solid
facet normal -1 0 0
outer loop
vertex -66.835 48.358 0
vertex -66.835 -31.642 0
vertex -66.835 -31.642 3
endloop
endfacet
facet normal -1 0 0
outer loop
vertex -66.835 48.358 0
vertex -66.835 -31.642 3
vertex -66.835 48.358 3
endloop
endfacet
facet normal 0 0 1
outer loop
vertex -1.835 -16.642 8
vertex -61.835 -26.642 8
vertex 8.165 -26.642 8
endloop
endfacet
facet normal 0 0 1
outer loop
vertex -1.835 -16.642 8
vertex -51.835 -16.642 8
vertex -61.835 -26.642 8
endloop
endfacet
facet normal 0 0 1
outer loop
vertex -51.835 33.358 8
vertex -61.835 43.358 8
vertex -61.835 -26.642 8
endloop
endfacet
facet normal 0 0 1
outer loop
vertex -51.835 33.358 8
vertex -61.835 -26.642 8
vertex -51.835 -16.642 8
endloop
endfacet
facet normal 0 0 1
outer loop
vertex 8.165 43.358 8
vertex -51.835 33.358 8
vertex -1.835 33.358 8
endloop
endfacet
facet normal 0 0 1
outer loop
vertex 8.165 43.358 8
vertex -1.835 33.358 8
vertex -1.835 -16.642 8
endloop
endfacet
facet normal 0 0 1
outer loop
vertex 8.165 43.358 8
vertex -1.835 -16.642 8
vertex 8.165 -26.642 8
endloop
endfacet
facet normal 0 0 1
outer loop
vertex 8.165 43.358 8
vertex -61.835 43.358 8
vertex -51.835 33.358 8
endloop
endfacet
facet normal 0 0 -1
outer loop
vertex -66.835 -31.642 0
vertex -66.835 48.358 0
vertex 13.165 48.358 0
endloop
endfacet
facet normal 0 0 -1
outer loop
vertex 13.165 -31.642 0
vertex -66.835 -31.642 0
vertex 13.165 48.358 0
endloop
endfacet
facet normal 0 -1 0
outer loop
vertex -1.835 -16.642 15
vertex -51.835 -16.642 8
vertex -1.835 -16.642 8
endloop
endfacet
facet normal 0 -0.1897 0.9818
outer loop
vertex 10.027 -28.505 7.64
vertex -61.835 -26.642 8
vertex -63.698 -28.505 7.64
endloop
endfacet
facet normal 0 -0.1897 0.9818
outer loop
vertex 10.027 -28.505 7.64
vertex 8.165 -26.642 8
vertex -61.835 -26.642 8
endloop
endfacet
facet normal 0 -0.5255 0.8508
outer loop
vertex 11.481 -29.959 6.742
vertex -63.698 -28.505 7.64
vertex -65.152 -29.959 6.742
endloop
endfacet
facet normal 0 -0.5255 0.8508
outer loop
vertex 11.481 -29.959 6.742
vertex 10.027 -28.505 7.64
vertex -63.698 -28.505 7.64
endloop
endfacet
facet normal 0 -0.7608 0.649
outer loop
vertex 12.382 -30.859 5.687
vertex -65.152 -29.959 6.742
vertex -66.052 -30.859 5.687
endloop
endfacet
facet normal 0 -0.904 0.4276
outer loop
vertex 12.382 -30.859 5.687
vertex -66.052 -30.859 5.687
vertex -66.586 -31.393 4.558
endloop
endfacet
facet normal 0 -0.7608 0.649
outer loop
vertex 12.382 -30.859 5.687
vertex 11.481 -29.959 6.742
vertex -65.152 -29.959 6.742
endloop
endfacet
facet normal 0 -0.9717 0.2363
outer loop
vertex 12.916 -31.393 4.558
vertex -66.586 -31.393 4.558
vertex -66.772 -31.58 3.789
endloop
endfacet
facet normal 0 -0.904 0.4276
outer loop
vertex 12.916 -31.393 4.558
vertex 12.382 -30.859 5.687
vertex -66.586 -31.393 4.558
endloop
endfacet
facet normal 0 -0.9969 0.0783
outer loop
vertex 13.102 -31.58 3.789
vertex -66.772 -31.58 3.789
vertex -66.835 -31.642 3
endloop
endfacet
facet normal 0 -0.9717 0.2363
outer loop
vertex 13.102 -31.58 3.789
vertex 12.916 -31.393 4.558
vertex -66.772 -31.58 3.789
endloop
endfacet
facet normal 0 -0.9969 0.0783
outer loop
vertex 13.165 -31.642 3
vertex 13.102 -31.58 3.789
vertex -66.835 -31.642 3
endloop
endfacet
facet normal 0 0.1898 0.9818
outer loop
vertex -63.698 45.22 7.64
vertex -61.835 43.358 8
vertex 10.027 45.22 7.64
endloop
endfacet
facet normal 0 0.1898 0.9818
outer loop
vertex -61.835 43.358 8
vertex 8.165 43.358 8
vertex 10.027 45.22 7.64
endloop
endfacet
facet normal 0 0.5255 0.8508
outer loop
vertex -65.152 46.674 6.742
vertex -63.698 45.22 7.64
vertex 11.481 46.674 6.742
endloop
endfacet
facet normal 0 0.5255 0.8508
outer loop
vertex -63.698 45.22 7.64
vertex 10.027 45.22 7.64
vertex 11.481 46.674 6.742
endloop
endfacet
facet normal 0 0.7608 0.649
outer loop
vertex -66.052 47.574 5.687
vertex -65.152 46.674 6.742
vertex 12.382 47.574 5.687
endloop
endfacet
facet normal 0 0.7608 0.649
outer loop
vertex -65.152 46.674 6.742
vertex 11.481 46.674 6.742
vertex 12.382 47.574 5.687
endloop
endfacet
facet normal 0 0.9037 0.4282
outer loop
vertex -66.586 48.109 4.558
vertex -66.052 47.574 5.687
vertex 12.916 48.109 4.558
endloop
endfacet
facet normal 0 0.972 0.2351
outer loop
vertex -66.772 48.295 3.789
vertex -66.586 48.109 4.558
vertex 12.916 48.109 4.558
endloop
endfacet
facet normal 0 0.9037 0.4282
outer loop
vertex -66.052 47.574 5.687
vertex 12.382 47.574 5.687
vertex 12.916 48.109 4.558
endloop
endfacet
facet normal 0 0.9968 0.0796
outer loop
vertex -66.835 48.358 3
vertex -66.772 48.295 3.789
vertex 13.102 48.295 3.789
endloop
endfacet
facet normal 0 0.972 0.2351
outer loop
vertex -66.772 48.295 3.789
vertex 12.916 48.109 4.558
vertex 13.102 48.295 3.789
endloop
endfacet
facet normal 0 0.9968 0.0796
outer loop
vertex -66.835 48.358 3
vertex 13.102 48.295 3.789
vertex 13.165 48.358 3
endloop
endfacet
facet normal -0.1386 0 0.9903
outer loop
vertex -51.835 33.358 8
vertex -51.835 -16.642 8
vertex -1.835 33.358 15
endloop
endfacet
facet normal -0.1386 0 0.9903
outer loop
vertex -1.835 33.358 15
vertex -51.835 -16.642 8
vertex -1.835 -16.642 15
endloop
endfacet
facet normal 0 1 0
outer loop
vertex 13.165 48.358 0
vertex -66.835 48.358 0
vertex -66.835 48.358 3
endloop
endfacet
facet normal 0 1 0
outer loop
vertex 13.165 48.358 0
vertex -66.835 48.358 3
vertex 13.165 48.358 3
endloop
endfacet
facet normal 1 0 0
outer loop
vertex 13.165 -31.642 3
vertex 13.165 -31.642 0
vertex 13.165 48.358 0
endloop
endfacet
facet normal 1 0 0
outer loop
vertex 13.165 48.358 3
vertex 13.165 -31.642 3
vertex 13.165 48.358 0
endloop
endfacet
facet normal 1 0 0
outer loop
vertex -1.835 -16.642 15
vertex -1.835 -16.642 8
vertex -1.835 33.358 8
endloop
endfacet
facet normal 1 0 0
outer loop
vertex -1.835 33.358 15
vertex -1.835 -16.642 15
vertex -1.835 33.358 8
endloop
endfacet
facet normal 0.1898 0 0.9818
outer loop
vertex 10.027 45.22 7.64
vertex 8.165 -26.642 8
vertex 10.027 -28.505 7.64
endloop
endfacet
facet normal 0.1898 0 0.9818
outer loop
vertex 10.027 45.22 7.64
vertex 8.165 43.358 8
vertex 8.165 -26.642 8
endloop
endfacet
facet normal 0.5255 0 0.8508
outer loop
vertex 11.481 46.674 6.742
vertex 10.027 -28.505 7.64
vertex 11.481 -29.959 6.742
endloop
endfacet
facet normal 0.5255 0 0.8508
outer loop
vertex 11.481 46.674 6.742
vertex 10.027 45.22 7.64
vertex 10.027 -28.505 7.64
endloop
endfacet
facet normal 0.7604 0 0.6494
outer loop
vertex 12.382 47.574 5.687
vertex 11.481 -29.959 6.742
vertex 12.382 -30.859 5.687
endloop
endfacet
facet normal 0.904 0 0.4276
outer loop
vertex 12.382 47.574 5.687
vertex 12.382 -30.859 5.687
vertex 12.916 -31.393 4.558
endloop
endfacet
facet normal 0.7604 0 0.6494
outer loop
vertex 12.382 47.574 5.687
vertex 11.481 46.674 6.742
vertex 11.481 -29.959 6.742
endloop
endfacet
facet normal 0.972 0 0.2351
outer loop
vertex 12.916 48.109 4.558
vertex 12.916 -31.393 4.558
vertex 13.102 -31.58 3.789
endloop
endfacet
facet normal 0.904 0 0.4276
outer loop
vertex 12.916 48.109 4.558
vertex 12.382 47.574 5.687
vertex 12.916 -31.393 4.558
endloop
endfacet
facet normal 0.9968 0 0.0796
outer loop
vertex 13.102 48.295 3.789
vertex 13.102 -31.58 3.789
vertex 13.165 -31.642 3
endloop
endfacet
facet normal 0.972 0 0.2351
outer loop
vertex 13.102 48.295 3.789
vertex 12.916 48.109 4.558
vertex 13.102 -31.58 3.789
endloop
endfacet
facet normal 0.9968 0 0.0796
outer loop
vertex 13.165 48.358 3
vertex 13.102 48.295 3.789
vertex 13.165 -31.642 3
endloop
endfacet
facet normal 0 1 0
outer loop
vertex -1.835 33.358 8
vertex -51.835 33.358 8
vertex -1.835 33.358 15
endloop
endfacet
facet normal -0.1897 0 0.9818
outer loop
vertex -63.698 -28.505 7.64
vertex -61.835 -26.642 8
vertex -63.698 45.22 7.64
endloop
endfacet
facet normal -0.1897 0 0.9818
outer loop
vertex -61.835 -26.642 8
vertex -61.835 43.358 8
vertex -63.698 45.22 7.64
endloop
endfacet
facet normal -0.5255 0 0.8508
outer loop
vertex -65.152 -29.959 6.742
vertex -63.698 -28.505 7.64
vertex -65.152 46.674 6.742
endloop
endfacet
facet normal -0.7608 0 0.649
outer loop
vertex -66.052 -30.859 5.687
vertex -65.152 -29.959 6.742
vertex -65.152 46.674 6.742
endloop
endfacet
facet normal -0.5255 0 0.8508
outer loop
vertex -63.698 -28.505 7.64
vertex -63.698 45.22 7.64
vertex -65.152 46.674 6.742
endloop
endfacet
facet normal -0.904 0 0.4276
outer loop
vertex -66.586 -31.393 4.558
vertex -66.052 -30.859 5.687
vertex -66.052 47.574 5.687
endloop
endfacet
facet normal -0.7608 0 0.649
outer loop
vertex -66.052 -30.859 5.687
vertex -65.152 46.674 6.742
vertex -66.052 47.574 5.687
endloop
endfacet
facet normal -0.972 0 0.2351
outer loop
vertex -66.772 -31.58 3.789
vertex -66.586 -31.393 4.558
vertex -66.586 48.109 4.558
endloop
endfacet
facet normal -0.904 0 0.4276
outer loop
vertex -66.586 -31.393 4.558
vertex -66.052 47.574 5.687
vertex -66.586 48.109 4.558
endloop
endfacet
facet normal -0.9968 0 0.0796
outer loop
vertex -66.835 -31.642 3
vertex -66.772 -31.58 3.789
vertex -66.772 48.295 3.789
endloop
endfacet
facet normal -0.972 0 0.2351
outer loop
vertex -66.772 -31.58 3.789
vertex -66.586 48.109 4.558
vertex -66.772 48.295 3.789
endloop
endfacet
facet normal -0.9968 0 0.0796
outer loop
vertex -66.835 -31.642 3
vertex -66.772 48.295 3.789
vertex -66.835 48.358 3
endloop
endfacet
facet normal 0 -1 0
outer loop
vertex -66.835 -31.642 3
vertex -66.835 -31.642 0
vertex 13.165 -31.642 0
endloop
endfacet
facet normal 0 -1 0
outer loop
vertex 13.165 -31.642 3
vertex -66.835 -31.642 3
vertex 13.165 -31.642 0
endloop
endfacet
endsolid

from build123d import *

# Parameters (mm, degrees)
F0_W     = 80
F0_H     = 80
F0_W_2   = 50
F0_H_2   = 50
F1_DEPTH = 8
F2_DEPTH = 15
F4_DEPTH = 50
F5_R     = 5


with BuildPart() as f1:
    # F0 (on Top) → F1 (new body)
    with BuildSketch(Plane.XY):
        with Locations((-26.835108, 8.357681)):
            Rectangle(F0_W, F0_H)
        with Locations((-26.835108, 8.357681)):
            Rectangle(F0_W_2, F0_H_2, mode=Mode.SUBTRACT)
    extrude(amount=F1_DEPTH)

    # F0 (on Top) → F2 (join)
    with BuildSketch(Plane.XY):
        with Locations((-26.835108, 8.357681)):
            Rectangle(F0_W_2, F0_H_2)
    extrude(amount=F2_DEPTH)

    # F3 (on face) → F4 (cut, through all)
    with BuildSketch(Plane.XZ.offset(16.642319)):
        Polygon((-51.835108, 15), (-51.835108, 8), (-1.835108, 15), align=None)
    extrude(amount=-F4_DEPTH, mode=Mode.SUBTRACT)

    # F5
    f5_edges = [f1.edges().sort_by_distance(p)[0] for p in [
        (-26.835108, 48.357681, 8),
        (-66.835108, 8.357681, 8),
        (-26.835108, -31.642319, 8),
        (13.164892, 8.357681, 8),
    ]]
    fillet(f5_edges, radius=F5_R)


solid = f1.part
